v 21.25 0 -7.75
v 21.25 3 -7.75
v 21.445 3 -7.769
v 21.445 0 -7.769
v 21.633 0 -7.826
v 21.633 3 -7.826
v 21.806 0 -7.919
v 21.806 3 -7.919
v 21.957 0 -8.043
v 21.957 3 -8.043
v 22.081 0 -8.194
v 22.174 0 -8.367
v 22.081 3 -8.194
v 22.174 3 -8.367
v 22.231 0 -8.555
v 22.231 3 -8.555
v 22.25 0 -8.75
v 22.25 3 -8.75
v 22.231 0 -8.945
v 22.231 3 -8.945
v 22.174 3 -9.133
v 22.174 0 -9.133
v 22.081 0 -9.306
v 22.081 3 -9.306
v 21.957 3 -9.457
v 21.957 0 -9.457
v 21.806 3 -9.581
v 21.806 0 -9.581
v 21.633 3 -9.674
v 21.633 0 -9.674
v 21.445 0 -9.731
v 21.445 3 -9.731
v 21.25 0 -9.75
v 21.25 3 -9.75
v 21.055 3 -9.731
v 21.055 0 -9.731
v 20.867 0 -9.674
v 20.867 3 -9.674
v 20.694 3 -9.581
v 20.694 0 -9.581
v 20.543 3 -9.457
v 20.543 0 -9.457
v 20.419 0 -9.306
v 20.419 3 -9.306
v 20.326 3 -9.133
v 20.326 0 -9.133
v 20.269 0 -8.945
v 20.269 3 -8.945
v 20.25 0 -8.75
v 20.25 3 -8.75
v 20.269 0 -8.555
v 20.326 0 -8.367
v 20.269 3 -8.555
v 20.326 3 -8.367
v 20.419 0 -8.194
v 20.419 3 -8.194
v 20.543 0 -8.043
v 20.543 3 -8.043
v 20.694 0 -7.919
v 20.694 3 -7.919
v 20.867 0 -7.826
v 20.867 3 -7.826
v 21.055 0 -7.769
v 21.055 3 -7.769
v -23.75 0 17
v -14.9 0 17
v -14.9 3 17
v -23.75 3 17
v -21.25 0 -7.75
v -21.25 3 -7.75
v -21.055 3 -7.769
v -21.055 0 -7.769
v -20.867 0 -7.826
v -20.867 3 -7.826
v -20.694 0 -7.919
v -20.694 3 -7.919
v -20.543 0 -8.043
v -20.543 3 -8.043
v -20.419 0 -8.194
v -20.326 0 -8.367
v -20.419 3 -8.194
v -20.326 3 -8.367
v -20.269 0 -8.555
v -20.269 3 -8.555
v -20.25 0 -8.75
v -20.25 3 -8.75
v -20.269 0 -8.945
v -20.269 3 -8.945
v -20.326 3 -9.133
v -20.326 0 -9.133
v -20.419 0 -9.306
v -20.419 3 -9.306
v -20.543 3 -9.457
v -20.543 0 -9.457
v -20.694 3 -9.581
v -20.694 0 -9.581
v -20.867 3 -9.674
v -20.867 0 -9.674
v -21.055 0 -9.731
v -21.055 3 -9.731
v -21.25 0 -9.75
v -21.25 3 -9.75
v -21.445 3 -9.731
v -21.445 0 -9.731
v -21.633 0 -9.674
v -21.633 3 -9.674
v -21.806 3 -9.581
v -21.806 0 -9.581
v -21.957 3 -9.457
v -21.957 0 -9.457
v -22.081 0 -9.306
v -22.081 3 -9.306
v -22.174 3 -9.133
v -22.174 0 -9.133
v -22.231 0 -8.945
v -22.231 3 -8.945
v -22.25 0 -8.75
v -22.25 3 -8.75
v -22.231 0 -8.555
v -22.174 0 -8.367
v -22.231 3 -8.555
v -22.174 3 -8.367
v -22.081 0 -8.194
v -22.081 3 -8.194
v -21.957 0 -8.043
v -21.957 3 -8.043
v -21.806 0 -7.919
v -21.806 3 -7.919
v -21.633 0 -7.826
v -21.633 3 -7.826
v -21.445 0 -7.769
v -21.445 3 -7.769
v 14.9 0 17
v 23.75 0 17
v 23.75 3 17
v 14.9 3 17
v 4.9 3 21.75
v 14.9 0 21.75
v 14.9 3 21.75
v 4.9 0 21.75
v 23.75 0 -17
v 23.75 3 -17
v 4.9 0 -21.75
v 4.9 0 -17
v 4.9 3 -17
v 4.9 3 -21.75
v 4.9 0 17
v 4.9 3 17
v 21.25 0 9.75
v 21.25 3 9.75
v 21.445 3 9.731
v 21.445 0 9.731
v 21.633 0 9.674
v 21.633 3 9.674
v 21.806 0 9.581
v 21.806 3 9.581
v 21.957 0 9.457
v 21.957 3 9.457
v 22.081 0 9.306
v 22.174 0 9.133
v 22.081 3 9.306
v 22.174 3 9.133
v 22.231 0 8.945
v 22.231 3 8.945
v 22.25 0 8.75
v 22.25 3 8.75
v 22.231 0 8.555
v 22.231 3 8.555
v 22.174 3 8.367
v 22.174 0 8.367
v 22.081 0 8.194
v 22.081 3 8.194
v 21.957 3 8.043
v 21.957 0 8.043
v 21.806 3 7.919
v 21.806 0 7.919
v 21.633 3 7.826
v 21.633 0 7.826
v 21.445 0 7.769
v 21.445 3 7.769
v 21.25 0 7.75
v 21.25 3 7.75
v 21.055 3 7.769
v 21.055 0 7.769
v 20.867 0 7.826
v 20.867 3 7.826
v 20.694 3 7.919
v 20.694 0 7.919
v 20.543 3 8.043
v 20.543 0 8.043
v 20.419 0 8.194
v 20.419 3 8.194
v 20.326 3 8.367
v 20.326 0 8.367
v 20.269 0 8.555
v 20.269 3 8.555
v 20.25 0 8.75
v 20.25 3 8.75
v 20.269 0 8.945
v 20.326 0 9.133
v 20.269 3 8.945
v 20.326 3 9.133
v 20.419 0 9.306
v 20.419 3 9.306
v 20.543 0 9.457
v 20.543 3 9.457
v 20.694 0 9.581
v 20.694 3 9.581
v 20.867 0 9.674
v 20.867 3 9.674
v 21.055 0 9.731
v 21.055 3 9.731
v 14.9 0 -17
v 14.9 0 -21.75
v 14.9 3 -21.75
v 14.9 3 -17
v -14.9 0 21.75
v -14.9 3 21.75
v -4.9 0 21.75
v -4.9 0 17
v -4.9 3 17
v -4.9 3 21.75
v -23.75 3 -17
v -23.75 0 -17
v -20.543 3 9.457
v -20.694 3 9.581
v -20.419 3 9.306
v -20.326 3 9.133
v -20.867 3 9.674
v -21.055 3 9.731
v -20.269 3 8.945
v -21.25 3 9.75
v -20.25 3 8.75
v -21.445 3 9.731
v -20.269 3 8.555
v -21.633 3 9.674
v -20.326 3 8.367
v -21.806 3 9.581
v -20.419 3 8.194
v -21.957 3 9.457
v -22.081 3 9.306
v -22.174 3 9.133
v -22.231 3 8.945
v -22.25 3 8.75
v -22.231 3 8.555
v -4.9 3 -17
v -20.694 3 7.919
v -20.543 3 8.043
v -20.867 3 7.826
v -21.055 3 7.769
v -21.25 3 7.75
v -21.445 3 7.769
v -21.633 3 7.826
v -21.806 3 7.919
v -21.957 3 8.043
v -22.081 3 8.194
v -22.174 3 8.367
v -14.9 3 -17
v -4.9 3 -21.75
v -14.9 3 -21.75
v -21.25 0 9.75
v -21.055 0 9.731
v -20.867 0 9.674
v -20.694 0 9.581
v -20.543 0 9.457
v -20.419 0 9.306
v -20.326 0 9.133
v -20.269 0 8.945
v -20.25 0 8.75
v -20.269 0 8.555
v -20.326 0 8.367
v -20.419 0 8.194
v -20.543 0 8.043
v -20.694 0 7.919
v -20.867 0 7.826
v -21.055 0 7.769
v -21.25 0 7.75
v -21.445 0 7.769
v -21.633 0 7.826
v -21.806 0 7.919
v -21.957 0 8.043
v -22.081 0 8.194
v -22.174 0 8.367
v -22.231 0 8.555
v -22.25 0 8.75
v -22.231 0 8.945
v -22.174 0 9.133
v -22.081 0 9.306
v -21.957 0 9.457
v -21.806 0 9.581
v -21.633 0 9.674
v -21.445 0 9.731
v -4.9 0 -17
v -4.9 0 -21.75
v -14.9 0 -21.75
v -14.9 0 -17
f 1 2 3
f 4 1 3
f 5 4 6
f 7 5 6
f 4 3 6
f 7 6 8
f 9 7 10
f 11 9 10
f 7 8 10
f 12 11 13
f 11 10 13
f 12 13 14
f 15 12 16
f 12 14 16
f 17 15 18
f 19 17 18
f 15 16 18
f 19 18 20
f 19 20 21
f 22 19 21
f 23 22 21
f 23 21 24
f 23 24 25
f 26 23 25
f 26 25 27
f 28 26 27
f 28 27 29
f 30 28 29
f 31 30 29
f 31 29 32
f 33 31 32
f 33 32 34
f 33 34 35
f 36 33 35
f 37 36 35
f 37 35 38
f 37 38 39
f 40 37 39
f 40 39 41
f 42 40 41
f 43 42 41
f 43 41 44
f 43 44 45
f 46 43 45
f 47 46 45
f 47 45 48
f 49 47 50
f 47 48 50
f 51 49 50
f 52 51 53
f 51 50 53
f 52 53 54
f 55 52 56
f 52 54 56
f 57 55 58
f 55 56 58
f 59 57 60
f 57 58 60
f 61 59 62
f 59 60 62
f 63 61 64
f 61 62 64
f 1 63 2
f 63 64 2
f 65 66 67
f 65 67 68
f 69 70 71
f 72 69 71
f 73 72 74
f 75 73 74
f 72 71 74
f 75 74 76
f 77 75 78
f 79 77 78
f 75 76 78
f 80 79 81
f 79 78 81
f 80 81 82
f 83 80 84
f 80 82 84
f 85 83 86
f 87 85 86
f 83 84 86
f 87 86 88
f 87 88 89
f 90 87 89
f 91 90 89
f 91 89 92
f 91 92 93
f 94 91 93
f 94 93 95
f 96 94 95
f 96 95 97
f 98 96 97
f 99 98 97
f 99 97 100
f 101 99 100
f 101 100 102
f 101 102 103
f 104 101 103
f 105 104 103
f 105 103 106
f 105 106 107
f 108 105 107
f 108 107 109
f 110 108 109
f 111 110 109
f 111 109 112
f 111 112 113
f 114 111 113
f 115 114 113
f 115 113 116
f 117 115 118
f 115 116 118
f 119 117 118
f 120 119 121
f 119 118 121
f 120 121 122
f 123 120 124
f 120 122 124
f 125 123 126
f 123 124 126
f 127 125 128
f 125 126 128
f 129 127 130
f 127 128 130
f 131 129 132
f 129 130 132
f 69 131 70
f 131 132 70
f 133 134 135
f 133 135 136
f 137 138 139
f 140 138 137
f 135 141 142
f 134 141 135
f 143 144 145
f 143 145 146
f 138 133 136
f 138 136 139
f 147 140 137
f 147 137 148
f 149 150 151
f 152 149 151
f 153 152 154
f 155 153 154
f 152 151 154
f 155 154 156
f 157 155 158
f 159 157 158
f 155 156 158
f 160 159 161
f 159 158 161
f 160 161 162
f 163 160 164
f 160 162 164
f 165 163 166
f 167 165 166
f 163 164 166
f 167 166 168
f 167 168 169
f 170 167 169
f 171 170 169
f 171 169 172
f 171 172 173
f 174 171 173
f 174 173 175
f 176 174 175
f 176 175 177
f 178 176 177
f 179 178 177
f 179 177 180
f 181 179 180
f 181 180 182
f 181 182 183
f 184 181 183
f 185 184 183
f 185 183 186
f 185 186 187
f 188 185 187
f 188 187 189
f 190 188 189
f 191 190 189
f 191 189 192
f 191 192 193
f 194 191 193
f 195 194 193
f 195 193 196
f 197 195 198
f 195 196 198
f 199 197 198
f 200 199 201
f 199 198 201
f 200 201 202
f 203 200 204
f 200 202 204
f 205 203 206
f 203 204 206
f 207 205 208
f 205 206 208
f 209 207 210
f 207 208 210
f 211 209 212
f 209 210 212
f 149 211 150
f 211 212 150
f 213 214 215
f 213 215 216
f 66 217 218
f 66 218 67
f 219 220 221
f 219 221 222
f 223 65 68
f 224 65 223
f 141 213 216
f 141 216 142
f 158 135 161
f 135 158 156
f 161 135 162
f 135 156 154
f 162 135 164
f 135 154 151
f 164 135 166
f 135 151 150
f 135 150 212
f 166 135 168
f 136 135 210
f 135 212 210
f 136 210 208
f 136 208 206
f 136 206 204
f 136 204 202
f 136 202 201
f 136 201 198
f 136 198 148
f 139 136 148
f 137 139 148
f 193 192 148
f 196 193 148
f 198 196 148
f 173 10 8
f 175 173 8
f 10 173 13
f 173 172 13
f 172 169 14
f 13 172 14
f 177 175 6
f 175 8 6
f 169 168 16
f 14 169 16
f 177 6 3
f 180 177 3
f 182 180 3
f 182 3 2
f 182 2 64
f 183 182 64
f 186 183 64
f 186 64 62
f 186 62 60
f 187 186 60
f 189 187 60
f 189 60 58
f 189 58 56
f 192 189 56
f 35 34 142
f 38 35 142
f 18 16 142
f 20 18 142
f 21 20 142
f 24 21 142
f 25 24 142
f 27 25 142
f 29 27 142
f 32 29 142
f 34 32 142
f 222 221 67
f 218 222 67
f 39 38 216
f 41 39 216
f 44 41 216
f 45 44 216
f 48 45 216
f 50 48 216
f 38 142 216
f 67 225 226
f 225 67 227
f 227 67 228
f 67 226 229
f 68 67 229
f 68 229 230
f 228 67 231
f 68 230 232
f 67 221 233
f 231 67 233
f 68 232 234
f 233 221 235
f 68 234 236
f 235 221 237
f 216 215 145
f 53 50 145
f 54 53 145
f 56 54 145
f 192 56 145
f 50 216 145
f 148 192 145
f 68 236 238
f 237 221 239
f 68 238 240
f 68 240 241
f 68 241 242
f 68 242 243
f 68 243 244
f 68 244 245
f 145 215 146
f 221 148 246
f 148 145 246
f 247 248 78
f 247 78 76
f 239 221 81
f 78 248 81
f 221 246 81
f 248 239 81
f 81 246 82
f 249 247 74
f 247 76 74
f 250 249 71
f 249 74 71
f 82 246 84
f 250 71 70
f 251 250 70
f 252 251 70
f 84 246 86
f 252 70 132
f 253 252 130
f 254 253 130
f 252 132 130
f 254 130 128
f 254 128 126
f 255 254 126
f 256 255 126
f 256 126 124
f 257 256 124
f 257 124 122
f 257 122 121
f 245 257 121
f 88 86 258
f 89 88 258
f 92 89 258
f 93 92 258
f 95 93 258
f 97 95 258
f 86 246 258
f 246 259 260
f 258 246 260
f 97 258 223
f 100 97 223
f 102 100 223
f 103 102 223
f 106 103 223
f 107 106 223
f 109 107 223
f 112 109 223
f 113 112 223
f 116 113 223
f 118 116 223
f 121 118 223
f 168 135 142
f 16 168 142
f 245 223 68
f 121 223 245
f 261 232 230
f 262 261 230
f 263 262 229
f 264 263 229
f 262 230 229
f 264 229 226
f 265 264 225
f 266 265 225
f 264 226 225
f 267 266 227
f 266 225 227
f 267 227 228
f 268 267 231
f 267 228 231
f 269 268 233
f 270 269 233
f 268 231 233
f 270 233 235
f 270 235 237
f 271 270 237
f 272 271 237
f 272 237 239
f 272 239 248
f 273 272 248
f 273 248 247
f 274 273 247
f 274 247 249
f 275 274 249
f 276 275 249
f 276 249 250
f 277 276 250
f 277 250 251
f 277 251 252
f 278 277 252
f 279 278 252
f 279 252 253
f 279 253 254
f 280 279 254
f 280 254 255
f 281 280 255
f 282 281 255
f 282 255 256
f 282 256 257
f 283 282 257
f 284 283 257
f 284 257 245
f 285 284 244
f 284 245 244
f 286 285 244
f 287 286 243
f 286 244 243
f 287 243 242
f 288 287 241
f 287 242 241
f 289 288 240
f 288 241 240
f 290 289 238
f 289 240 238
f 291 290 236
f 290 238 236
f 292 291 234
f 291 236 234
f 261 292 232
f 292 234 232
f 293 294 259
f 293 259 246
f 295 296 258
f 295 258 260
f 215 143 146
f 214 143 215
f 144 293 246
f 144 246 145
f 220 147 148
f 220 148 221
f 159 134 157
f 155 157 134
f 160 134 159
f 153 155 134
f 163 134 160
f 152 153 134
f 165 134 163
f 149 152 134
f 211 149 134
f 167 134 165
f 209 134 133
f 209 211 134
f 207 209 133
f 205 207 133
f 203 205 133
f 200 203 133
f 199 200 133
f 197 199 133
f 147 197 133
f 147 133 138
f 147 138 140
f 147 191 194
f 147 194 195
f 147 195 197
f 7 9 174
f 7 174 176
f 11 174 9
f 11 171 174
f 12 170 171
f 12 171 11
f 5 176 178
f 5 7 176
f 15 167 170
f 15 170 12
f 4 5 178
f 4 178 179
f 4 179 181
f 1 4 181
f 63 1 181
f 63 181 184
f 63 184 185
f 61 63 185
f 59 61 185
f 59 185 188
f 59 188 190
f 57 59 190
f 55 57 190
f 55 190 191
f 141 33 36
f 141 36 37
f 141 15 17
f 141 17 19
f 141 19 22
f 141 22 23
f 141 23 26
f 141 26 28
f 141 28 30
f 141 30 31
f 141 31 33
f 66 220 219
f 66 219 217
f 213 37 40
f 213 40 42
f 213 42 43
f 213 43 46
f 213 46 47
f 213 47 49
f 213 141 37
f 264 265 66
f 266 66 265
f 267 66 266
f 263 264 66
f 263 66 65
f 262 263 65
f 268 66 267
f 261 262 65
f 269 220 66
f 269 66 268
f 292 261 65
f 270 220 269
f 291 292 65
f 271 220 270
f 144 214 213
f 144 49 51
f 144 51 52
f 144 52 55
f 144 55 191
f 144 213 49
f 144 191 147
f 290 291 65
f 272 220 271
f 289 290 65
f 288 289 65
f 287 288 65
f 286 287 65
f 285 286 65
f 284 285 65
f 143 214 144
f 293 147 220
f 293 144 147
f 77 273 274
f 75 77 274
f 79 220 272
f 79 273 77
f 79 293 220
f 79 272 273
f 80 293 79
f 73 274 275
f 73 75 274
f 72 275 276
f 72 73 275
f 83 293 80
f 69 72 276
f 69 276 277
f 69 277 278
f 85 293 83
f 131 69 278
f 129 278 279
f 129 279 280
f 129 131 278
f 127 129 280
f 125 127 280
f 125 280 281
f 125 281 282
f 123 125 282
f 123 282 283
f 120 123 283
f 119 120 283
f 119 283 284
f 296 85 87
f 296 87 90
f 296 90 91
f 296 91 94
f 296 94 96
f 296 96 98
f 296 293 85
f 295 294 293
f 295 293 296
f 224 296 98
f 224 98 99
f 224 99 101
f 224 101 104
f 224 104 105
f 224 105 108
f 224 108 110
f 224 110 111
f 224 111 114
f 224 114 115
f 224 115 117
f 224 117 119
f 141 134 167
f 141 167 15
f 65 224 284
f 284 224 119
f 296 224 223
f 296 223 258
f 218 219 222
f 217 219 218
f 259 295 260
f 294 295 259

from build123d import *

# Parameters (mm, degrees)
BOSS_EXTRUDE1_DEPTH = 3
SKETCH2_R           = 1
CUT_EXTRUDE1_DEPTH  = 10


with BuildPart() as part:
    # Sketch1 → Boss-Extrude1 (new body)
    with BuildSketch(Plane(origin=(0, 0, 0), x_dir=(1, 0, 0), z_dir=(0, 1, 0))):
        Polygon((4.9, 17), (4.9, 21.75), (14.9, 21.75), (14.9, 17), (23.75, 17), (23.75, -17), (14.9, -17), (14.9, -21.75), (4.9, -21.75), (4.9, -17), (-4.9, -17), (-4.9, -21.75), (-14.9, -21.75), (-14.9, -17), (-23.75, -17), (-23.75, 17), (-14.9, 17), (-14.9, 21.75), (-4.9, 21.75), (-4.9, 17), align=None)
    extrude(amount=BOSS_EXTRUDE1_DEPTH)

    # Sketch2 → Cut-Extrude1 (cut)
    with BuildSketch(Plane(origin=(0, 3, 0), x_dir=(1, 0, 0), z_dir=(0, 1, 0))):
        with Locations(Location((-21.25, 8.75, 0), (0, 0, 270))):
            Circle(SKETCH2_R)
        with Locations(Location((-21.25, -8.75, 0), (0, 0, 270))):
            Circle(SKETCH2_R)
        with Locations(Location((21.25, -8.75, 0), (0, 0, 270))):
            Circle(SKETCH2_R)
        with Locations(Location((21.25, 8.75, 0), (0, 0, 270))):
            Circle(SKETCH2_R)
    extrude(amount=-CUT_EXTRUDE1_DEPTH, mode=Mode.SUBTRACT)


solid = part.part
